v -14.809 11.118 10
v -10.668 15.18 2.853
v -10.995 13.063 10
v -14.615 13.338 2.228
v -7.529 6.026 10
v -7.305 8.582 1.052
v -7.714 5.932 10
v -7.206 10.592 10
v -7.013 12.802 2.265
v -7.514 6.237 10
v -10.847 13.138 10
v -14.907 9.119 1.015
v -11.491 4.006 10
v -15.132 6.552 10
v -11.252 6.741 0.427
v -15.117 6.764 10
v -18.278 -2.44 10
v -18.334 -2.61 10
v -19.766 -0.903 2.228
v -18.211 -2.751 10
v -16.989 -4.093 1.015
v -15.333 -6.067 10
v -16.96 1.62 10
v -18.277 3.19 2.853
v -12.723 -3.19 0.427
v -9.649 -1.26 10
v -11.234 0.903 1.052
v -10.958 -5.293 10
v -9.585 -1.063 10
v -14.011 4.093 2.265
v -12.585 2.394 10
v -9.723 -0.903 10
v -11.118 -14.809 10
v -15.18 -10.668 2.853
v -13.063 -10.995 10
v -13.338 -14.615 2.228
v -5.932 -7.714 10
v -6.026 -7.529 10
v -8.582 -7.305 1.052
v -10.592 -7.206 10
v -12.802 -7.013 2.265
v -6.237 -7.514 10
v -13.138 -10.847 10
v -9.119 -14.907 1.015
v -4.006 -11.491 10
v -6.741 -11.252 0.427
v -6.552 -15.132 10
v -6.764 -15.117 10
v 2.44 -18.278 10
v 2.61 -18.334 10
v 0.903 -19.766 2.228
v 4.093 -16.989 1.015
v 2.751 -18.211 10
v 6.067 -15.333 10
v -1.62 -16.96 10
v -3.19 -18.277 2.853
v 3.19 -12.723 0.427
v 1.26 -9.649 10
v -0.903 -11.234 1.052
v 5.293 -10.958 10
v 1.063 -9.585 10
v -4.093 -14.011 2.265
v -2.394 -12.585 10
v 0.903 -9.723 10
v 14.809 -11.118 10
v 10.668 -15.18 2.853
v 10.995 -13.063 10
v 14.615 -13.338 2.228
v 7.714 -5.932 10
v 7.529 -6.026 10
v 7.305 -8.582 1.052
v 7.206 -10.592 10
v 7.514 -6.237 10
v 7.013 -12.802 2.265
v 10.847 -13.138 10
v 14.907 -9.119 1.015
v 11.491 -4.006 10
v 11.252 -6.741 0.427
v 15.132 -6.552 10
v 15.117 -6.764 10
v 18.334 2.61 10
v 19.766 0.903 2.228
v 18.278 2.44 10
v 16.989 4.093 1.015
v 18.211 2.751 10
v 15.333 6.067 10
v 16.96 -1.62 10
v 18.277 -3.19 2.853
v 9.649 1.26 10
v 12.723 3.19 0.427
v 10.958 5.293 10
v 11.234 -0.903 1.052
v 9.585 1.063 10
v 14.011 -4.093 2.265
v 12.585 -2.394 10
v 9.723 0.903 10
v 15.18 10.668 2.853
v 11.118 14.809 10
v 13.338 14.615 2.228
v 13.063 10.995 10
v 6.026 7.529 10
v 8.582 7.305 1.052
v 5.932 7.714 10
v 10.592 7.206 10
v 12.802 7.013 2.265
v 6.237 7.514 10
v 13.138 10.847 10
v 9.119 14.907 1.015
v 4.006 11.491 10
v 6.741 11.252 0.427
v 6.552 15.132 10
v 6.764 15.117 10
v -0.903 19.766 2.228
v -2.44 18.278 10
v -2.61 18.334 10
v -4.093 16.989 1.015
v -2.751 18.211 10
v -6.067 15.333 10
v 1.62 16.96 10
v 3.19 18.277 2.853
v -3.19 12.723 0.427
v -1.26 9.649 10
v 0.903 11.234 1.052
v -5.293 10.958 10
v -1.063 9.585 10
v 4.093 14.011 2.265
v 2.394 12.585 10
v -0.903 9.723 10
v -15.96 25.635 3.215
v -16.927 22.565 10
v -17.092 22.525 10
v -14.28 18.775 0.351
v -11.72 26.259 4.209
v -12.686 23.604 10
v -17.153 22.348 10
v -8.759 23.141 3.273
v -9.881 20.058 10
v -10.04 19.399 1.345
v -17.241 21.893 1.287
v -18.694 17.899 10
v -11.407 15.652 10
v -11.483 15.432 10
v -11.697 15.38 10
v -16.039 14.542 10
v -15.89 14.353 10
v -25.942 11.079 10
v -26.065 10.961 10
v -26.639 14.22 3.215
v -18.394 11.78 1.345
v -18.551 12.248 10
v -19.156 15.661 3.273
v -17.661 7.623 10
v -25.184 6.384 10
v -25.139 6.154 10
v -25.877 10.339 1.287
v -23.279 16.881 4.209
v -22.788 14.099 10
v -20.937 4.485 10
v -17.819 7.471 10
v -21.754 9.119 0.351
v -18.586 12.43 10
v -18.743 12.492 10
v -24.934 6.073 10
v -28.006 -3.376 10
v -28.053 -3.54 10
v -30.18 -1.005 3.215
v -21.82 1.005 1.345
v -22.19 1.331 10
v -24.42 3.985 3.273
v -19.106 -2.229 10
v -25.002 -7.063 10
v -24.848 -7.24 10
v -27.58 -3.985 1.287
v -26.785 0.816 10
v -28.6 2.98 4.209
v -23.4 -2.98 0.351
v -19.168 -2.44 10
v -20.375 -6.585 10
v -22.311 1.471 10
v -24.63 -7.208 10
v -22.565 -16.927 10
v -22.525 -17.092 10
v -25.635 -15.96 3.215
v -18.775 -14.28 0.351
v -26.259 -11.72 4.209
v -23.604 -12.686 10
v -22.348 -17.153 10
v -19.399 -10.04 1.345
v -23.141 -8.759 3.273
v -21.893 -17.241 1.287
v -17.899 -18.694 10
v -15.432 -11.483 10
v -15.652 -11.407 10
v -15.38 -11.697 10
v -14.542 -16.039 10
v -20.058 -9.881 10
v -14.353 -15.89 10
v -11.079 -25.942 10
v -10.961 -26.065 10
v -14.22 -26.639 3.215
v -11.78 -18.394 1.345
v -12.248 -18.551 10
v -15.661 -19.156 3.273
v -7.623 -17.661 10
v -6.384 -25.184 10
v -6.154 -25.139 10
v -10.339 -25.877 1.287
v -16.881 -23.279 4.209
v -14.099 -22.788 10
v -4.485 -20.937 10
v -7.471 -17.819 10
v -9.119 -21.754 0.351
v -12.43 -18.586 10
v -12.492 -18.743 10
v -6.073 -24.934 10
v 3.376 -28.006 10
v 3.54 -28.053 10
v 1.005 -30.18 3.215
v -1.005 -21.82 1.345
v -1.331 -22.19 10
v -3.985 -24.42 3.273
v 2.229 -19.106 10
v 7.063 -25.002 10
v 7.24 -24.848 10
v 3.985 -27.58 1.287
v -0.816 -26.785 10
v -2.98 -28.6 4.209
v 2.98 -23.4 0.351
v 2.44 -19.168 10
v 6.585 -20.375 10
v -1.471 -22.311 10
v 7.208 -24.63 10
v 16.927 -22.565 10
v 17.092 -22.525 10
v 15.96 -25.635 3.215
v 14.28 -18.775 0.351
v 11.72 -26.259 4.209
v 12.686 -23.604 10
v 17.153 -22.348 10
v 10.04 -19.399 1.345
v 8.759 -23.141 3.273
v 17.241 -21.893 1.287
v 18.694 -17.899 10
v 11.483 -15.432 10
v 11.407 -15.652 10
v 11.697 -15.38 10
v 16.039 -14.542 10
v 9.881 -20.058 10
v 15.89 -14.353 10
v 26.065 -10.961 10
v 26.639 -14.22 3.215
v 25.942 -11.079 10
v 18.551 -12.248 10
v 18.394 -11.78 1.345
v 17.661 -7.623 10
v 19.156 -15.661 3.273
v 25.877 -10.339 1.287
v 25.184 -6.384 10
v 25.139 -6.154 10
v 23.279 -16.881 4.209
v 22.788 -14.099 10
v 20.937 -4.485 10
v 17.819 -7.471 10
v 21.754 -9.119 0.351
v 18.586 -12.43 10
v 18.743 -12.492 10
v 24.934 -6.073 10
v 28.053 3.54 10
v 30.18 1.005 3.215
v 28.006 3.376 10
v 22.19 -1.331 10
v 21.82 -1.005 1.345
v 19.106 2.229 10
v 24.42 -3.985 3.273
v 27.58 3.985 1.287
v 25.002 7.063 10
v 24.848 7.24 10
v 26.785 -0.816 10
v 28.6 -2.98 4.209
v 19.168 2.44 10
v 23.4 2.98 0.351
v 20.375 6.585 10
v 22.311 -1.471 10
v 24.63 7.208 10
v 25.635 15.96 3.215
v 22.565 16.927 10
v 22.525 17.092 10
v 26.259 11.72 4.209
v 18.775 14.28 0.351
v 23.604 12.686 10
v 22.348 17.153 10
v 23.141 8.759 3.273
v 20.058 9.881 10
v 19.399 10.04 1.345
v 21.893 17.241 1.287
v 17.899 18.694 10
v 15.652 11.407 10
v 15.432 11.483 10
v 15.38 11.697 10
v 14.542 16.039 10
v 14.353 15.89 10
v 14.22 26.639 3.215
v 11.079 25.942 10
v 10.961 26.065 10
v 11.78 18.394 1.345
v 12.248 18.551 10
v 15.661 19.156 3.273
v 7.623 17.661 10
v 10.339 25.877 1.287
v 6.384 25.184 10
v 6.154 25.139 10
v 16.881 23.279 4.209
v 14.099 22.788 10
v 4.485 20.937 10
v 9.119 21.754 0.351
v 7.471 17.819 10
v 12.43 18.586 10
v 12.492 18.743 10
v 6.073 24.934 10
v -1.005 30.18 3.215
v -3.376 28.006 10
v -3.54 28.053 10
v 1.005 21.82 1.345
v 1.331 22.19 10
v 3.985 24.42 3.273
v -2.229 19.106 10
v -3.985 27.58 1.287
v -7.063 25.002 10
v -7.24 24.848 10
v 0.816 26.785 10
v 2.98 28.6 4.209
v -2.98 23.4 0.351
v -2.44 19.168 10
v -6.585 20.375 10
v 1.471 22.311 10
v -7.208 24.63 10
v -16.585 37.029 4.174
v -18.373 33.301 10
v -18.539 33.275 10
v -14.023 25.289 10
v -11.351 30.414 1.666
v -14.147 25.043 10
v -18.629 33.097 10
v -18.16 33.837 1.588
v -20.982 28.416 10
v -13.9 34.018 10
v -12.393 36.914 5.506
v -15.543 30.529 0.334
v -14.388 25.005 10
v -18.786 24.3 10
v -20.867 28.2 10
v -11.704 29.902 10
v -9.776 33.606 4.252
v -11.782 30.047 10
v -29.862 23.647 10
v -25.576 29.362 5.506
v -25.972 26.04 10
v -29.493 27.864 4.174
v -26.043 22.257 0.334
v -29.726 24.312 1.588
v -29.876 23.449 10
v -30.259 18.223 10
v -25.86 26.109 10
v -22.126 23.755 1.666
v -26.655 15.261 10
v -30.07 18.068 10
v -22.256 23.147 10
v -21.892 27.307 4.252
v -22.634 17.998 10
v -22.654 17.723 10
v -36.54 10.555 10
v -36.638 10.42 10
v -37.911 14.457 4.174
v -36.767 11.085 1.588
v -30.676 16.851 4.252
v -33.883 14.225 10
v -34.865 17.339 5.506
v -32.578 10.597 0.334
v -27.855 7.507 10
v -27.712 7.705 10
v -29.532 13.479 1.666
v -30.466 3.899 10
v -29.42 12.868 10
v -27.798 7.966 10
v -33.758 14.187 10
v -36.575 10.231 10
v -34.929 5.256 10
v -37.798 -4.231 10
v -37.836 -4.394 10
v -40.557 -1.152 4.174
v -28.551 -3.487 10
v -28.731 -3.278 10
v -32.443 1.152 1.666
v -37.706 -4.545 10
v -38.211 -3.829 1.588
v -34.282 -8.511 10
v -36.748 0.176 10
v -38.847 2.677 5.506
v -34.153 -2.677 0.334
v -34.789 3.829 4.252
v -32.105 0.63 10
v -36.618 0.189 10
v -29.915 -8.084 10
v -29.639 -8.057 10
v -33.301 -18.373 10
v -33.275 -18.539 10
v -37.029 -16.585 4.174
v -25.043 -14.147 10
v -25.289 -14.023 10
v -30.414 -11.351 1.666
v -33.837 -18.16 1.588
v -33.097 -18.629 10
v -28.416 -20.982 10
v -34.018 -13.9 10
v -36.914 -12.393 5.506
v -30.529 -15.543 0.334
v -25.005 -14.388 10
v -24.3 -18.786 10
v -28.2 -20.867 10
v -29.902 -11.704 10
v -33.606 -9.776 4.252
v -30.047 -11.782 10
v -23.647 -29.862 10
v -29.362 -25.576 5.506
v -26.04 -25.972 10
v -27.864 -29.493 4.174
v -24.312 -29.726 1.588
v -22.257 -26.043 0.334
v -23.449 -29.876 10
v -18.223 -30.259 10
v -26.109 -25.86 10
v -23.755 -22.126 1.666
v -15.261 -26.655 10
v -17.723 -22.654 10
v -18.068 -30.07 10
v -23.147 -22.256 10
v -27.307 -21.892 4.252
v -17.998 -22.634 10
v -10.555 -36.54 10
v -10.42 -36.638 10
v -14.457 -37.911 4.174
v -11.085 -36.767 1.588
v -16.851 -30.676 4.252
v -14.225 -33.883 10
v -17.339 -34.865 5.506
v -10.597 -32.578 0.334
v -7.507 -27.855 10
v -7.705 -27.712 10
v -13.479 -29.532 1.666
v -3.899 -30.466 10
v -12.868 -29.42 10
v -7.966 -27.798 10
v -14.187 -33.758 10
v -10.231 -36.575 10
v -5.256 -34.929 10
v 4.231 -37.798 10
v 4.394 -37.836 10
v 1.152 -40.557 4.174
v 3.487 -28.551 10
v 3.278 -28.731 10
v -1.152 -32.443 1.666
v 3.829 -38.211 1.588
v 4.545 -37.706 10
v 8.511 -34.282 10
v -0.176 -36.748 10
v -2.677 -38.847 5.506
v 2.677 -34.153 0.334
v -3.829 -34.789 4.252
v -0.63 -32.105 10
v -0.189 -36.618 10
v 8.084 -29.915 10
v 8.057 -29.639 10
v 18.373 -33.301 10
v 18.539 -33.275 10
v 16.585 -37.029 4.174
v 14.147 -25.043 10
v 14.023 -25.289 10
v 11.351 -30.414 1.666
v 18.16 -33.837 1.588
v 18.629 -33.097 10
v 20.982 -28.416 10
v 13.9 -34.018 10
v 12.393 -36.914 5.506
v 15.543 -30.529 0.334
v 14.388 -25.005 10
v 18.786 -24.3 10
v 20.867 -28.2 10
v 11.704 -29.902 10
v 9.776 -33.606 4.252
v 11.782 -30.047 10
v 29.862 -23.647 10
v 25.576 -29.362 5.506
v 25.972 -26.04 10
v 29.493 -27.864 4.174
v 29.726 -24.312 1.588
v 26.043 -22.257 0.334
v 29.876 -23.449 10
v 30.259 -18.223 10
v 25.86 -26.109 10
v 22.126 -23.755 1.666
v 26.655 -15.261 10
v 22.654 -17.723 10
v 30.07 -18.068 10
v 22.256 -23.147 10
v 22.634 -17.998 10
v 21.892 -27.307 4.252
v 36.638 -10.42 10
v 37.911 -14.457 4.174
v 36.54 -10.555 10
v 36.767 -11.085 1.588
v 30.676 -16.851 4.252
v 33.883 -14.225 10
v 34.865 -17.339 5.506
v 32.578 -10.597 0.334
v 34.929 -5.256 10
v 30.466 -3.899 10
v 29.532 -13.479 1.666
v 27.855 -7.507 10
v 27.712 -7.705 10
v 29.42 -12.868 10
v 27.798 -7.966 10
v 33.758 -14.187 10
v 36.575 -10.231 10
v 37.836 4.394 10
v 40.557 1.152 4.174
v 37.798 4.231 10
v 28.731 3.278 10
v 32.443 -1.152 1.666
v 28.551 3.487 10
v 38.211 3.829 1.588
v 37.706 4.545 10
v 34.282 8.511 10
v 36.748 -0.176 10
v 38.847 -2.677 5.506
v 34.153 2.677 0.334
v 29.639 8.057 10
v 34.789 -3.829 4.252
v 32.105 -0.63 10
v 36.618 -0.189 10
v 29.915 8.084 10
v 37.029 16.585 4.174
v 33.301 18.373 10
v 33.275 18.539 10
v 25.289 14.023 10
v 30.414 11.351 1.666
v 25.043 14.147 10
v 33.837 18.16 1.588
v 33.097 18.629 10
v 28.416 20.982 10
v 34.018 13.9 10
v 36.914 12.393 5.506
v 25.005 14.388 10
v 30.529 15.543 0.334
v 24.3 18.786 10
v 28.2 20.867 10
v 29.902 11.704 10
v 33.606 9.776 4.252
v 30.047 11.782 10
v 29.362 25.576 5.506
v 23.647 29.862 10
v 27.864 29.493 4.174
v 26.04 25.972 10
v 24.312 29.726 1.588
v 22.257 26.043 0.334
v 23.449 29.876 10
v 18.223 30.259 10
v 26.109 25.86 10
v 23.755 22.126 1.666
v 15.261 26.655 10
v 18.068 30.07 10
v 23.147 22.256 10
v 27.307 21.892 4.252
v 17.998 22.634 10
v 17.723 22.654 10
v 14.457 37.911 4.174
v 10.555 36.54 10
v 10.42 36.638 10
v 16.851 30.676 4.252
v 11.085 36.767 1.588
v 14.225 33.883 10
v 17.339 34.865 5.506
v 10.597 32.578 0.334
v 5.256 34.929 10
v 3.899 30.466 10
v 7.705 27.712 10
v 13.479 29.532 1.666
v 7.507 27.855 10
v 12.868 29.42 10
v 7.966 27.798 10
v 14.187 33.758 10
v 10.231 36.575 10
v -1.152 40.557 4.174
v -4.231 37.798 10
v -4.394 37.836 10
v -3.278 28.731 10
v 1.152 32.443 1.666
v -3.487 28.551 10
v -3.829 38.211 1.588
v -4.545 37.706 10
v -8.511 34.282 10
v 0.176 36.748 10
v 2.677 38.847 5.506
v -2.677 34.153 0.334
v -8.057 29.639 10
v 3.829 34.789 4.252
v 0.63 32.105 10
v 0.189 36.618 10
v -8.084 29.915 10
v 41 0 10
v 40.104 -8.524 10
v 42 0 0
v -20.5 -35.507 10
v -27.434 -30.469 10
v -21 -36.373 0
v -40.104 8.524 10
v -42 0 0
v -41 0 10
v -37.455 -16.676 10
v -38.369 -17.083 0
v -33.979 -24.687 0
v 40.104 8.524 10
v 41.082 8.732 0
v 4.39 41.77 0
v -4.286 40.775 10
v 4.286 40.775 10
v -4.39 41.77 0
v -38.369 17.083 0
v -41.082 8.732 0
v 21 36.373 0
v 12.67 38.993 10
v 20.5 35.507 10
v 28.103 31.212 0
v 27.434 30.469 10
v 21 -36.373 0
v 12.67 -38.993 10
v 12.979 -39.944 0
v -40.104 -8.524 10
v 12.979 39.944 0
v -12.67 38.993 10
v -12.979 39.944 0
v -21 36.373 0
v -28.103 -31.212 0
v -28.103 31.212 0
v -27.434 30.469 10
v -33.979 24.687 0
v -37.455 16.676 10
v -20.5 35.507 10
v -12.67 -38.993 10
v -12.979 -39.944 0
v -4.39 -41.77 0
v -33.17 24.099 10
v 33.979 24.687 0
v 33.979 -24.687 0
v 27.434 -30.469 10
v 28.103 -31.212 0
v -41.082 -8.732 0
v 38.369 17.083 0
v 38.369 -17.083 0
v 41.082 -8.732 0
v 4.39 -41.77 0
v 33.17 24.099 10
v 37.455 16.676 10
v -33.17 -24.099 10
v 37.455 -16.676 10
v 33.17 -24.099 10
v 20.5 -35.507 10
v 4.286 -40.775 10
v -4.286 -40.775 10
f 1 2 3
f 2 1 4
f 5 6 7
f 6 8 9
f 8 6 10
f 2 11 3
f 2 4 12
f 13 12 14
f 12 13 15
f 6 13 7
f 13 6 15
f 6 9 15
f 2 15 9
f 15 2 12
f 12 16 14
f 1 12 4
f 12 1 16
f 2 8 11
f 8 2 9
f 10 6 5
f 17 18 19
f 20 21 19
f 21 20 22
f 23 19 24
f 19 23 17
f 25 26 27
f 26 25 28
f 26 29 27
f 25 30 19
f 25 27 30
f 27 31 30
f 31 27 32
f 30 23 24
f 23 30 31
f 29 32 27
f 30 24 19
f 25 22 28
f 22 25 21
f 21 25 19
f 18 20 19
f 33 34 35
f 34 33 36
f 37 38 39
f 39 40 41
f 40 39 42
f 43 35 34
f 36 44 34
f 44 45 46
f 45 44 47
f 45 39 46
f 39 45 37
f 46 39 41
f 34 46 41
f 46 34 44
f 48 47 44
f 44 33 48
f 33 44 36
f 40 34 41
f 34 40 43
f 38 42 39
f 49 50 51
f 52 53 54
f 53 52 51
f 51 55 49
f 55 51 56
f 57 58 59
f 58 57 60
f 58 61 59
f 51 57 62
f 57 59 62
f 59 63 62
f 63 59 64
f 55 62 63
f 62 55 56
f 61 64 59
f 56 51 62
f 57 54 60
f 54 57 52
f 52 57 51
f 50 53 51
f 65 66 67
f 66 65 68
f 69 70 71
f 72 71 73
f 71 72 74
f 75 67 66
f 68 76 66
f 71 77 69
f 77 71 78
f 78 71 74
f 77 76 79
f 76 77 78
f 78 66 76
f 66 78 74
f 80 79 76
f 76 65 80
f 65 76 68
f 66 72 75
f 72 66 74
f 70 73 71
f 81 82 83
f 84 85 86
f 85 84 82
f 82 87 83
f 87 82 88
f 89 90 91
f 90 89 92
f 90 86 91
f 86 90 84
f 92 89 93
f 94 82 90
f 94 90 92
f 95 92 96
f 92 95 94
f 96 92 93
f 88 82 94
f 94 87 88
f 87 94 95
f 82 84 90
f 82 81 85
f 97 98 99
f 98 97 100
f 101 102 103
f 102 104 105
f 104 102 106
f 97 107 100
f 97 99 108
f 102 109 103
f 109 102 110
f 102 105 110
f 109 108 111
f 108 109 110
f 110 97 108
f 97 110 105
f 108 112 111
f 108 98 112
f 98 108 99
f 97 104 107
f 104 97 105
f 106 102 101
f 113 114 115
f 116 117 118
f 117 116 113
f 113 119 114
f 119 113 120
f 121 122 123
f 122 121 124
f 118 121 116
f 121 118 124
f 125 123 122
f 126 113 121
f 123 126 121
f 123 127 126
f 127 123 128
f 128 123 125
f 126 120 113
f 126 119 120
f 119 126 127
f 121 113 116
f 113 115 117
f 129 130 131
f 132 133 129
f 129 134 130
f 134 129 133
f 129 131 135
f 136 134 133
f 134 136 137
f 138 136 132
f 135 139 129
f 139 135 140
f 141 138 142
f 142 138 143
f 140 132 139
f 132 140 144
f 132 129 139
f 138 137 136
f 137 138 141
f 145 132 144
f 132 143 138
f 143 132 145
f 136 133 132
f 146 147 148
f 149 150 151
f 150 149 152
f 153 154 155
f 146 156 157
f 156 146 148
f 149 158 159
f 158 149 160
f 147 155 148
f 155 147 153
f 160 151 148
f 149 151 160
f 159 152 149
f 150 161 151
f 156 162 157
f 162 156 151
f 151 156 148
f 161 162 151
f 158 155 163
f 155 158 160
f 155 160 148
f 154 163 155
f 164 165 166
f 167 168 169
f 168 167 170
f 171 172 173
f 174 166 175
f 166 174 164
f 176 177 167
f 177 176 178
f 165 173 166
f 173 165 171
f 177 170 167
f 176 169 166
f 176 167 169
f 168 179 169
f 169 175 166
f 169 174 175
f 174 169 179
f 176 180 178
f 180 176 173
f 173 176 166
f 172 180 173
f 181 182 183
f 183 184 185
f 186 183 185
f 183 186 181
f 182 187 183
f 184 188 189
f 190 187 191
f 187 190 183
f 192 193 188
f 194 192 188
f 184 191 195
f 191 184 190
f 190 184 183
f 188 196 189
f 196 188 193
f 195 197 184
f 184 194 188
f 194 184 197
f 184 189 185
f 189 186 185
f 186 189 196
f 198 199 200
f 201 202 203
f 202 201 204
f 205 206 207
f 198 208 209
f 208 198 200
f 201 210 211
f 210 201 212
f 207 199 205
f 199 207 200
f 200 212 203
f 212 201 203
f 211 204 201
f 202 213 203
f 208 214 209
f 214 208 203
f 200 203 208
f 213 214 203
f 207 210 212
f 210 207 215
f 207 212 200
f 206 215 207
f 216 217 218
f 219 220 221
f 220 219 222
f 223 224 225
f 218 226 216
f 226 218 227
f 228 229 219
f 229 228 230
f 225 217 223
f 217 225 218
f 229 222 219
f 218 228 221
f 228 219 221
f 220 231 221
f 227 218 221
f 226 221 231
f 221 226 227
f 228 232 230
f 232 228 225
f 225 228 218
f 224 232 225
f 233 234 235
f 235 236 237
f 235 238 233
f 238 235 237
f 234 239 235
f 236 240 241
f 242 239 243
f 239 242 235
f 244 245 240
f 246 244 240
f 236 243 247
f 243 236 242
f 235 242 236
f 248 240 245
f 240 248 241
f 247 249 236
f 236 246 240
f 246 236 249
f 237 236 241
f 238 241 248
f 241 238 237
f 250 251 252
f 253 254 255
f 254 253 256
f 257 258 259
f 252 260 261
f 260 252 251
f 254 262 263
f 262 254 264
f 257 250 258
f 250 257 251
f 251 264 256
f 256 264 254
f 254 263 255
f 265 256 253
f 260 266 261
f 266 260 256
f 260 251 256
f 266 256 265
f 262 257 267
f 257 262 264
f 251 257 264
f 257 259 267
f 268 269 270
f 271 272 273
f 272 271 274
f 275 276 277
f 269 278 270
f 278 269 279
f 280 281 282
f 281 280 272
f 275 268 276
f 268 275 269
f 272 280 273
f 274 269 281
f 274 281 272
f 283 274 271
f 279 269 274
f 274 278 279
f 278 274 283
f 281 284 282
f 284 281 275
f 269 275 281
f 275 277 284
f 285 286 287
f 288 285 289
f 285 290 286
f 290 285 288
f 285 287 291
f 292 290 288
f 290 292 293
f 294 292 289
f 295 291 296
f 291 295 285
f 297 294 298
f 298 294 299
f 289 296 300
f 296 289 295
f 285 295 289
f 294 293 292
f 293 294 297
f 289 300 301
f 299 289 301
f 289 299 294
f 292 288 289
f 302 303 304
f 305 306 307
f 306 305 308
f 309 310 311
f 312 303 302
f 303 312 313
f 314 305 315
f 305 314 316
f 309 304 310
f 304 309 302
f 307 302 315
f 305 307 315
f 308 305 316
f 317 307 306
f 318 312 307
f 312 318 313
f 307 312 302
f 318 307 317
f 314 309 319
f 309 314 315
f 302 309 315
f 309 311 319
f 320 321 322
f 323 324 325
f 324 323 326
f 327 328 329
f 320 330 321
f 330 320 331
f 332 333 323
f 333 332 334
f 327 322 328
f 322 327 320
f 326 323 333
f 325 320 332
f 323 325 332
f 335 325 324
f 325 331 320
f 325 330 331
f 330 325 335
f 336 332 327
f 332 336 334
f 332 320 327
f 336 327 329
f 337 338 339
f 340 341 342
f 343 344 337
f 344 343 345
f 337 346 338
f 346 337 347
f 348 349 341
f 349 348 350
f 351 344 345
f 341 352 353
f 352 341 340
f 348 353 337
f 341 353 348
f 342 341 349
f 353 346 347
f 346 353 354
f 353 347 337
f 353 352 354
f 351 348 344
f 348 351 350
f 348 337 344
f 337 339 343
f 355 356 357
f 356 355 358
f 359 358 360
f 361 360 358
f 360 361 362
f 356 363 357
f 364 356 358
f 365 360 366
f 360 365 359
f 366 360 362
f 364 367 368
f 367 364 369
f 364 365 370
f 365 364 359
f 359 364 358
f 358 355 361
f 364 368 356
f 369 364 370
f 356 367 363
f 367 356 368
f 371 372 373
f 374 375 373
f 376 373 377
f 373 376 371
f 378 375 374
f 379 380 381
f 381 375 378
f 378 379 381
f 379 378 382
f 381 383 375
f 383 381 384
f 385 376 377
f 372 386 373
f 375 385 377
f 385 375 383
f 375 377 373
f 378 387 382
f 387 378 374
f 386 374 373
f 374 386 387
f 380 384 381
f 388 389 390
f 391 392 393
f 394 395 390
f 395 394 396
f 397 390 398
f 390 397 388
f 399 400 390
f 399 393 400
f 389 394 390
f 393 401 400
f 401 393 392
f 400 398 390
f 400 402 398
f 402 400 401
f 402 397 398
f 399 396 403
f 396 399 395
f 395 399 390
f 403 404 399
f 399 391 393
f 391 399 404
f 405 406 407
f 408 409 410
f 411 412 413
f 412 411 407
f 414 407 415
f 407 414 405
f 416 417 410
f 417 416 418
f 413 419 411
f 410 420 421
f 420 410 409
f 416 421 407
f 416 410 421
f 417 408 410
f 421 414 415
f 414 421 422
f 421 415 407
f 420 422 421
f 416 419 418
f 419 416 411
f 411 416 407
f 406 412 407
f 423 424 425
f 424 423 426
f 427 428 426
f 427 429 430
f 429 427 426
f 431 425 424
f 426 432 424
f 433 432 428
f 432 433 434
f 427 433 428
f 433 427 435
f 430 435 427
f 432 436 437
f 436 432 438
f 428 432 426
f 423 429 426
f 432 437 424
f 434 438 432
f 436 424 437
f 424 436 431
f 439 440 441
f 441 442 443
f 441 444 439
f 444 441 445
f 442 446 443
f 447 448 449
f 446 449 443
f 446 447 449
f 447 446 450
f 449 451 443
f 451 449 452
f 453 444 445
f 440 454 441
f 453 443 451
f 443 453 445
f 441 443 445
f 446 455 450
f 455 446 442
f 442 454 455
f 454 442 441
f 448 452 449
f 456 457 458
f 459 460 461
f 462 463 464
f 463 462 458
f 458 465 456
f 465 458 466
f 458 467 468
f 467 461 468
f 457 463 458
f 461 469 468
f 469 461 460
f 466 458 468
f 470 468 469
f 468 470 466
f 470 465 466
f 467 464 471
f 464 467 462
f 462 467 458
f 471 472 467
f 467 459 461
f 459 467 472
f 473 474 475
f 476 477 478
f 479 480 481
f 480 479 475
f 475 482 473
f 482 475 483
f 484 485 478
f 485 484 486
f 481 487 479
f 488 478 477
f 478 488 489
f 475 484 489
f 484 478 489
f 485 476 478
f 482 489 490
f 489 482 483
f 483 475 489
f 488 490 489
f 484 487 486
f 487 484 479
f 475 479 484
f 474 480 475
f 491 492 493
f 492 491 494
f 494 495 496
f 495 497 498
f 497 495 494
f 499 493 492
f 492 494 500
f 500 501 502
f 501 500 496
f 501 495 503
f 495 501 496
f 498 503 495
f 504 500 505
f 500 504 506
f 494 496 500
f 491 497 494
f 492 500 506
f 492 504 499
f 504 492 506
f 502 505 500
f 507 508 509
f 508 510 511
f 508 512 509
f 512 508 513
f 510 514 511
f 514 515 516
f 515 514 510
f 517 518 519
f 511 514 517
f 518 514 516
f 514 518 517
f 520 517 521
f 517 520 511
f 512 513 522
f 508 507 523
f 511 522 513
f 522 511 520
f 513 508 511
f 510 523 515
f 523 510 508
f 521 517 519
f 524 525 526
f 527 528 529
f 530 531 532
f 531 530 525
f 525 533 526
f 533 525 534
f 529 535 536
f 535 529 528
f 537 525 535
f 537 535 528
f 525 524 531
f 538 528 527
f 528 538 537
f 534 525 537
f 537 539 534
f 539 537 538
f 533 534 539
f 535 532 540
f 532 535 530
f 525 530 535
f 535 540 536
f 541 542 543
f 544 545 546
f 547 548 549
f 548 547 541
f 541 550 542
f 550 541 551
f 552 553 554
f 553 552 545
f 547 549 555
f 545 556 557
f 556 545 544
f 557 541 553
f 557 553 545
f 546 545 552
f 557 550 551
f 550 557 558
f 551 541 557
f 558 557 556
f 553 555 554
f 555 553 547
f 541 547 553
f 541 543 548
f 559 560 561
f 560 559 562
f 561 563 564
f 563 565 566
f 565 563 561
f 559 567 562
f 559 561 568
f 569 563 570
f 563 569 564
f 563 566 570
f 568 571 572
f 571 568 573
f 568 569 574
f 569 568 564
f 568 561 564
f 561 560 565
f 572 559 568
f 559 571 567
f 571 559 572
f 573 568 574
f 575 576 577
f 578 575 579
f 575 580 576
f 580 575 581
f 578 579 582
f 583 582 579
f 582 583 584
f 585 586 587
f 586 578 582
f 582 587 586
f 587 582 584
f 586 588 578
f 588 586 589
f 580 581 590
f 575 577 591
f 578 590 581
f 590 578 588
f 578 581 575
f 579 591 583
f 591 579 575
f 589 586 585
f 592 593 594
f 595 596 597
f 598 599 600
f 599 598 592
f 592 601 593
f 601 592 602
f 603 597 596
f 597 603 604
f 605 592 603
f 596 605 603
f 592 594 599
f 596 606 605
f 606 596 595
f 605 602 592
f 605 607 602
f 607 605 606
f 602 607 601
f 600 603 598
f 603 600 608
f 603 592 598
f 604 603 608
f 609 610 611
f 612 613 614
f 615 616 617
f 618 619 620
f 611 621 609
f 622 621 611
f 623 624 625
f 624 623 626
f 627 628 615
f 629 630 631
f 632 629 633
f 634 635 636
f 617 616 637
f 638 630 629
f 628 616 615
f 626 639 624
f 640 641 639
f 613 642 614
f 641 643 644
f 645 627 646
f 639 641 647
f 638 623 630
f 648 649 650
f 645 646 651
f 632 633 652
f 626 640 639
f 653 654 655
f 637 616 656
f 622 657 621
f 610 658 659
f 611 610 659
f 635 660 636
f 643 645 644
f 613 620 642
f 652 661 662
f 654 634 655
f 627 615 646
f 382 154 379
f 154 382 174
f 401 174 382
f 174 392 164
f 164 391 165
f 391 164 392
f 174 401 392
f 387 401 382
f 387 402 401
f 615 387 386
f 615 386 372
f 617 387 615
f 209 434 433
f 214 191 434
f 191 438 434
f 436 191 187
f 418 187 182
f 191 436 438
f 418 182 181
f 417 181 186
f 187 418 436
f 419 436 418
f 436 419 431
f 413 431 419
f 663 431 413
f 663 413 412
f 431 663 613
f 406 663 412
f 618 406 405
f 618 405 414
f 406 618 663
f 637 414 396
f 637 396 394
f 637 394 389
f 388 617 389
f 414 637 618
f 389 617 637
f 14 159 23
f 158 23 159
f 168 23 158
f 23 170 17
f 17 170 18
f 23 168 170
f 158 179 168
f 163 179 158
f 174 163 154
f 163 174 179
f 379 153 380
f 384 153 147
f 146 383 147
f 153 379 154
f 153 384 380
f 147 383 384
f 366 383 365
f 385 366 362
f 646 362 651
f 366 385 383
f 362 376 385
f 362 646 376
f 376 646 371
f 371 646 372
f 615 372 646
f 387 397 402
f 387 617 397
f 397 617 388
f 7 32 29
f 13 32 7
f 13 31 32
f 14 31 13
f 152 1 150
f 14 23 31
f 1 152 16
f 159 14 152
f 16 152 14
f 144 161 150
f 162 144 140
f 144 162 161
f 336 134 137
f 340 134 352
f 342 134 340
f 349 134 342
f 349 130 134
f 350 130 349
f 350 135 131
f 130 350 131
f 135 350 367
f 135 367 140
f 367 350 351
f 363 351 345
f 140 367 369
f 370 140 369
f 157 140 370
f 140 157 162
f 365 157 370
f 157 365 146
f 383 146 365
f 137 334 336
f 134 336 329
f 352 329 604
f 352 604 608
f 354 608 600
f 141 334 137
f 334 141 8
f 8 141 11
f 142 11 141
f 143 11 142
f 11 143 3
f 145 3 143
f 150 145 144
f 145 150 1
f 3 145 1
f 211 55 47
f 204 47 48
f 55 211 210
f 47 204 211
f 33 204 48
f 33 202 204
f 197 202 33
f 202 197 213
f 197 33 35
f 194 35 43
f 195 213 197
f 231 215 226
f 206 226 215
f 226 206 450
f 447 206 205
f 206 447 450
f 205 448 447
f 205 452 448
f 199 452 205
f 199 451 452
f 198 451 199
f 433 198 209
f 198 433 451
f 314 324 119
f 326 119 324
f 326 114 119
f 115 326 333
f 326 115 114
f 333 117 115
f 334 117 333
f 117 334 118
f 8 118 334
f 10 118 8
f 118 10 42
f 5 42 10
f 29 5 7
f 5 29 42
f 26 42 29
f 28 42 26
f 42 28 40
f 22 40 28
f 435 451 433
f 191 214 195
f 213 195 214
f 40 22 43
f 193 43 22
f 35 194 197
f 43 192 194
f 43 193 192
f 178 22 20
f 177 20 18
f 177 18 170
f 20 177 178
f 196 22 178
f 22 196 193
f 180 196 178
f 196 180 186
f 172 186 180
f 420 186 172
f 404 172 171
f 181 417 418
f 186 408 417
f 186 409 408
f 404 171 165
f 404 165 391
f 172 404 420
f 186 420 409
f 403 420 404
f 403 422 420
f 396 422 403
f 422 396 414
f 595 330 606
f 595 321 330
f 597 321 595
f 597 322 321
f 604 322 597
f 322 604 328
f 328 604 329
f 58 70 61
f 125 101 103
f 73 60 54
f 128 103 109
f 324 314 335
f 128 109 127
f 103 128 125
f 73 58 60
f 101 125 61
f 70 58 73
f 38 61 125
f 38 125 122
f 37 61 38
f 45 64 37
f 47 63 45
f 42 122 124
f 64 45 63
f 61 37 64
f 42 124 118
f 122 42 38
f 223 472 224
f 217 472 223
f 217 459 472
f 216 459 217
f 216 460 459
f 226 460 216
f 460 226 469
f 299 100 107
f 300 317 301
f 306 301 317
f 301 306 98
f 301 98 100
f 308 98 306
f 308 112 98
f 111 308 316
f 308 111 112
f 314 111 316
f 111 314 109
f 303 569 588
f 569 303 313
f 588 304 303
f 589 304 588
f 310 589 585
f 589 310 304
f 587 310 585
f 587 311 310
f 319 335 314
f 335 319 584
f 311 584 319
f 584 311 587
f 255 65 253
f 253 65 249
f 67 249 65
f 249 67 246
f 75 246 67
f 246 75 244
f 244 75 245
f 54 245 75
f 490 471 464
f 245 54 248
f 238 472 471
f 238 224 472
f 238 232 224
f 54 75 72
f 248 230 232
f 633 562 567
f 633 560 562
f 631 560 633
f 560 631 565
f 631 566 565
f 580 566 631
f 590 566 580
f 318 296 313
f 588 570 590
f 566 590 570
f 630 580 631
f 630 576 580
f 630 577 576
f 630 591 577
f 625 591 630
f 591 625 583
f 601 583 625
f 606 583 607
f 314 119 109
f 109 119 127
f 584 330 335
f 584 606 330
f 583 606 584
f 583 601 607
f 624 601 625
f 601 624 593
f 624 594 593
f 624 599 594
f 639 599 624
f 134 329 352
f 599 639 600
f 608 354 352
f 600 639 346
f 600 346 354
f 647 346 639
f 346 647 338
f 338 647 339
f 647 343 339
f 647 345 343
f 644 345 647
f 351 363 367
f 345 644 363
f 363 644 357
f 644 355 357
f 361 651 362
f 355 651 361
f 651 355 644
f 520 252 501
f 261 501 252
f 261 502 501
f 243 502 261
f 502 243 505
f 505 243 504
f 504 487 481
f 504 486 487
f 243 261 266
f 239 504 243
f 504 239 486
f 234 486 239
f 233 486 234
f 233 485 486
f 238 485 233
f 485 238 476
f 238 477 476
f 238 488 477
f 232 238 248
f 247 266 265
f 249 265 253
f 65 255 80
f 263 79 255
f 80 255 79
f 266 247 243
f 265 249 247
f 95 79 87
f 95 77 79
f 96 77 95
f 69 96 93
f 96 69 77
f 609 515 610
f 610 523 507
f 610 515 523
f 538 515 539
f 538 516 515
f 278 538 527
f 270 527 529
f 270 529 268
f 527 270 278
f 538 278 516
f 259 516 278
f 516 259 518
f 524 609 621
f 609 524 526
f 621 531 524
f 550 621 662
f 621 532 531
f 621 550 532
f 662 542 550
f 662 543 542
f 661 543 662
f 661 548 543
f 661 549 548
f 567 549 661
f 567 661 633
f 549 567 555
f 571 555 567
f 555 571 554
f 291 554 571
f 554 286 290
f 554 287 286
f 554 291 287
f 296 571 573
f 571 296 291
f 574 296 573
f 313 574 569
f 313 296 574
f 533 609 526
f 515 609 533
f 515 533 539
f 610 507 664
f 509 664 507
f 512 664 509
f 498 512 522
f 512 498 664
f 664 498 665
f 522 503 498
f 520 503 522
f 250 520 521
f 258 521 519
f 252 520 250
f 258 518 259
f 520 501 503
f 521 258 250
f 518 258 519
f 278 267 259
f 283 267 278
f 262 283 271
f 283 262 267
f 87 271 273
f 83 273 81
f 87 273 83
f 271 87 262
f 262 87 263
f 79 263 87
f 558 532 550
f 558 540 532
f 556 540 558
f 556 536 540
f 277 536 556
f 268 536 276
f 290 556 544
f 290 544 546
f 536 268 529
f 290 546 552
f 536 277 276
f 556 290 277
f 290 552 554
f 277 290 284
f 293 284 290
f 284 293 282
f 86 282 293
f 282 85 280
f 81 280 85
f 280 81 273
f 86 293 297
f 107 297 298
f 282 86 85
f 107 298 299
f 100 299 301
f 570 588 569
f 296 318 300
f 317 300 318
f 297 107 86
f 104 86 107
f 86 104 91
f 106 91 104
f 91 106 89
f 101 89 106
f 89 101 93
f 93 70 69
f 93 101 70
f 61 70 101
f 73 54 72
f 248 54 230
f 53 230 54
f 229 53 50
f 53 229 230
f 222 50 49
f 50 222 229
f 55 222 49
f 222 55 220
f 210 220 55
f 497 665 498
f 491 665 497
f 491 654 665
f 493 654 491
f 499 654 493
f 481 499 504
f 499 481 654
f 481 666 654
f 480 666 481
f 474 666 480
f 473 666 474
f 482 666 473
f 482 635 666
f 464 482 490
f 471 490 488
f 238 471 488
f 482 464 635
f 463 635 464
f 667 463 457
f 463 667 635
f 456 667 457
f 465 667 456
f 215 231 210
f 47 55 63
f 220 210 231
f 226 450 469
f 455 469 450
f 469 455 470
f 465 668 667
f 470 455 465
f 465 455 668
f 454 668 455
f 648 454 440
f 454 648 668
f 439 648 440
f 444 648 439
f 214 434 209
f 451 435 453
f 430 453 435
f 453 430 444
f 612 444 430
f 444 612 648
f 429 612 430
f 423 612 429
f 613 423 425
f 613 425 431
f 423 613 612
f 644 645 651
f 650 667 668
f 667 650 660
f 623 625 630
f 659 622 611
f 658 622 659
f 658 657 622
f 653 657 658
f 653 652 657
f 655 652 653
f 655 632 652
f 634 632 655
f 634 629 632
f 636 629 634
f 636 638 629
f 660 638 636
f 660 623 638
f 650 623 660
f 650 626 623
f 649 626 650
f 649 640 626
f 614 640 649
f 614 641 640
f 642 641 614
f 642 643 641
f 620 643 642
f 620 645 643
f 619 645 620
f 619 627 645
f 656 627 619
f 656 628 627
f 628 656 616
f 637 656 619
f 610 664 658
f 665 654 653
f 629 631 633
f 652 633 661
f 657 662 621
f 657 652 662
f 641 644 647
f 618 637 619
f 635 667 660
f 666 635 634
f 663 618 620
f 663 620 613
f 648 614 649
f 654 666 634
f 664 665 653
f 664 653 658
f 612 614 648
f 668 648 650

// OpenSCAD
//======================================================================================  
module pencil(withTip) {
	if (withTip) {
		intersection() {
			cylinder(200,4.4,4.4,$fn=6);
			color([1,0.7,0.7,1]) union() {
				translate([0,0,174.9])cylinder(25,6,0.25,$fn=18);
				translate([0,0,0.05])cylinder(175,6,6,$fn=6);
			}
		}
		color([0.4,0.4,0.4,1]) translate([0,0,195.3])cylinder(5,1.3,0.25,$fn=18);
	} else {
		cylinder(200,4.4,4.4,$fn=6);
	}
}

pencils=4;
radius=5;
outangle=6;
roundangle=40;
ranginc=0;
oanginc=10;
radinc=10.5;
reduce=4;
layers=3;
maxcol=(layers*pencils*reduce)/70;
maxcola=maxcol+5;

//build platform for debug  
%color([0.5,0.5,0.5,0.1]) translate([-50,-50,-1.01]) cube([100,100,1]);
  
//======================================================================================
module pencils(withTips) {
	for(j=[1:layers])  {
		for(i=[1:pencils+(j*reduce)])  {
		     color([maxcol/(((j*pencils)+i)%maxcola),maxcol/(((j*pencils)+i*3)%maxcola),maxcol/(((j*pencils)+i*5)%maxcola),1]) {
			      rotate([0,0,i*(360/(pencils+(j*reduce)))])  translate([0,radius+(j*radinc),(j*0.64)+1]) rotate([0,0-(outangle+(oanginc*j)),roundangle+(ranginc*j)])  rotate([0,0,1])pencil(withTips);
		      }
		}
	}
}

module holder() {
	difference() {
		cylinder(10,10.5+(layers*radinc),9.5+(layers*radinc));
		pencils(false);
	}
}

holder();
showPencils=false;
if (showPencils) {
	pencils(true);
}
